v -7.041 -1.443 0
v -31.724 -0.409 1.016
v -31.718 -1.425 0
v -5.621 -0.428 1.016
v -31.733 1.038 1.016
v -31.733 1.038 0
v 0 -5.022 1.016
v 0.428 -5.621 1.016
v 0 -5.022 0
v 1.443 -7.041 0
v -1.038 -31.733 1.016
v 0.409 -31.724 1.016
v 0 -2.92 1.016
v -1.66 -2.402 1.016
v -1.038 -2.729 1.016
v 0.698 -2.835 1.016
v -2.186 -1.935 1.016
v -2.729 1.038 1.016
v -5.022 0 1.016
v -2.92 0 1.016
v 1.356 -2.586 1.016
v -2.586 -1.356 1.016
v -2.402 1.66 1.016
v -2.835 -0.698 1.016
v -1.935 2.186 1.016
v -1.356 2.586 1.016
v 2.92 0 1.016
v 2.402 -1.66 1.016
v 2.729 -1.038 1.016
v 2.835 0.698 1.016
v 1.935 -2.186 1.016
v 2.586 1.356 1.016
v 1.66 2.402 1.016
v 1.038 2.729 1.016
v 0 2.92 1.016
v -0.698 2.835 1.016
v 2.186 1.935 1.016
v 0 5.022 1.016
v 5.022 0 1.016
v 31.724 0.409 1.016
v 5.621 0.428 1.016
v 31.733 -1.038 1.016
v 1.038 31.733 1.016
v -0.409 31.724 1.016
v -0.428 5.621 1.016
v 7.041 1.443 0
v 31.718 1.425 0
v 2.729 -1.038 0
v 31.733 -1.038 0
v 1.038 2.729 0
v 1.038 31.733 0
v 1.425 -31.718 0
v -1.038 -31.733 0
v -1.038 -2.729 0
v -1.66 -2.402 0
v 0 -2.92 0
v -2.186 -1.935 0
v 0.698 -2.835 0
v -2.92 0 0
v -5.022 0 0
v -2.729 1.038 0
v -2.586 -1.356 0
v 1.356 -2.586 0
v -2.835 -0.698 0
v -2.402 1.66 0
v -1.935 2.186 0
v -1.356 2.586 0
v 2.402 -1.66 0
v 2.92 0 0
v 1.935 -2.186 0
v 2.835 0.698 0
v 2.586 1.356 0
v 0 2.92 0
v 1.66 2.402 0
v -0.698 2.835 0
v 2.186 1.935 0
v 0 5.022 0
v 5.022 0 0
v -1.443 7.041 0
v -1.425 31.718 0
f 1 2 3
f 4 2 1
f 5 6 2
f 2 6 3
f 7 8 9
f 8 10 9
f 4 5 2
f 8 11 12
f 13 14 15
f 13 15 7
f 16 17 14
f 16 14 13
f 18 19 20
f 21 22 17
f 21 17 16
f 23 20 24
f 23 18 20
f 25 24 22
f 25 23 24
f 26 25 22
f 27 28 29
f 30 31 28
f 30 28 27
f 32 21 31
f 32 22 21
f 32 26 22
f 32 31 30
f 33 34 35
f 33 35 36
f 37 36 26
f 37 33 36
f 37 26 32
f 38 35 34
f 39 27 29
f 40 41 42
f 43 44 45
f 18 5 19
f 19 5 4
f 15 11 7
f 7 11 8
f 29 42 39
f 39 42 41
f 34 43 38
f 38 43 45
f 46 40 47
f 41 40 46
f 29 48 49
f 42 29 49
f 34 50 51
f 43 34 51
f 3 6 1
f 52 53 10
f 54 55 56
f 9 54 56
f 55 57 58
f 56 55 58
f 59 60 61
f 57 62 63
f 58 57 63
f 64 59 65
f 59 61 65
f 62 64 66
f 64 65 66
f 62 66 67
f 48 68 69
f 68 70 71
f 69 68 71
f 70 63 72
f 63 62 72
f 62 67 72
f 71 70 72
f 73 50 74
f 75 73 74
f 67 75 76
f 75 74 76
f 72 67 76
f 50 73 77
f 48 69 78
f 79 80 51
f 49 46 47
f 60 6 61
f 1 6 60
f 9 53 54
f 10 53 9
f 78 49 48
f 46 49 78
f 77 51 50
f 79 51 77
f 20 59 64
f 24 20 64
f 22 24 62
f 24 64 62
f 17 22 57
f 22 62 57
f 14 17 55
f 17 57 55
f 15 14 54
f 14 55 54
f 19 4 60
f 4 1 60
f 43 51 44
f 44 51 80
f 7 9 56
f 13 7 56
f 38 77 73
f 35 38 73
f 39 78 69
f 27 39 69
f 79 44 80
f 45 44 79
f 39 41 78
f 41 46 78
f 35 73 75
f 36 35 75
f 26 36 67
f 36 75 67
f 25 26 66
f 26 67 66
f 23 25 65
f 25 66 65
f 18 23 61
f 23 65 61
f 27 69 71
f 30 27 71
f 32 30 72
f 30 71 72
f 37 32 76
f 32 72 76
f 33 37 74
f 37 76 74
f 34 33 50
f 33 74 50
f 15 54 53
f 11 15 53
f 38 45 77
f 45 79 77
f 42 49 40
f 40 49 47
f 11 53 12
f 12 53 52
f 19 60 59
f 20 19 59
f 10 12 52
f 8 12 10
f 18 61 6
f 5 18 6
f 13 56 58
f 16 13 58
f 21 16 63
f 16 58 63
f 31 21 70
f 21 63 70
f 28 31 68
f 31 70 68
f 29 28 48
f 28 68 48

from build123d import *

# Parameters (mm, degrees)
F1_DEPTH = 1.016
F2_SIZE  = 1.01599


# Not quite as in the source:
# - a fillet or chamfer is up to 0.001 mm smaller than in the source, because OpenCascade refuses the exact size


with BuildPart() as f1:
    # F0 (on Top) → F1 (new body)
    with BuildSketch(Plane.XY):
        with BuildLine():
            ThreePointArc((0, 2.9195159057), (0.527538065, 2.8714589869), (1.0377089673, 2.7288703199))
            Line((1.0377089673, 2.7288703199), (1.0377089673, 31.7330373601))
            Line((1.0377089673, 31.7330373601), (-1.4246536514, 31.7180210917))
            Line((-1.4246536514, 31.7180210917), (-1.4426441077, 7.0411415527))
            Line((-1.4426441077, 7.0411415527), (0, 5.0220009871))
            Line((0, 5.0220009871), (0, 2.9195159057))
        make_face()
        with BuildLine():
            Line((1.0377089673, 1.7452047762), (1.0377089673, 2.7288703199))
            ThreePointArc((1.0377089673, 2.7288703199), (0.527538065, 2.8714589869), (0, 2.9195159057))
            Line((0, 2.9195159057), (1.0377089673, 1.7452047762))
        make_face()
        with BuildLine():
            Line((1.7452047762, -1.0377089673), (2.9195159057, 0))
            ThreePointArc((2.9195159057, 0), (2.4034538646, 1.6574023784), (1.0377089673, 2.7288703199))
            Line((1.0377089673, 2.7288703199), (1.0377089673, 1.7452047762))
            Line((1.0377089673, 1.7452047762), (0, 2.9195159057))
            ThreePointArc((0, 2.9195159057), (-1.6574023784, 2.4034538646), (-2.7288703199, 1.0377089673))
            Line((-2.7288703199, 1.0377089673), (-1.7452047762, 1.0377089673))
            Line((-1.7452047762, 1.0377089673), (-2.9195159057, 0))
            ThreePointArc((-2.9195159057, 0), (-2.4034538646, -1.6574023784), (-1.0377089673, -2.7288703199))
            Line((-1.0377089673, -2.7288703199), (-1.0377089673, -1.7452047762))
            Line((-1.0377089673, -1.7452047762), (0, -2.9195159057))
            ThreePointArc((0, -2.9195159057), (1.6574023784, -2.4034538646), (2.7288703199, -1.0377089673))
            Line((2.7288703199, -1.0377089673), (1.7452047762, -1.0377089673))
        make_face()
        with BuildLine():
            Line((-1.7452047762, 1.0377089673), (-2.7288703199, 1.0377089673))
            ThreePointArc((-2.7288703199, 1.0377089673), (-2.8714589869, 0.527538065), (-2.9195159057, 0))
            Line((-2.9195159057, 0), (-1.7452047762, 1.0377089673))
        make_face()
        with BuildLine():
            ThreePointArc((2.7288703199, -1.0377089673), (2.8714589869, -0.527538065), (2.9195159057, 0))
            Line((2.9195159057, 0), (1.7452047762, -1.0377089673))
            Line((1.7452047762, -1.0377089673), (2.7288703199, -1.0377089673))
        make_face()
        with BuildLine():
            Line((5.0220009871, 0), (2.9195159057, 0))
            ThreePointArc((2.9195159057, 0), (2.8714589869, -0.527538065), (2.7288703199, -1.0377089673))
            Line((2.7288703199, -1.0377089673), (31.7330373601, -1.0377089673))
            Line((31.7330373601, -1.0377089673), (31.7180210917, 1.4246536514))
            Line((31.7180210917, 1.4246536514), (7.0411415527, 1.4426441077))
            Line((7.0411415527, 1.4426441077), (5.0220009871, 0))
        make_face()
        with BuildLine():
            ThreePointArc((-1.0377089673, -2.7288703199), (-0.527538065, -2.8714589869), (0, -2.9195159057))
            Line((0, -2.9195159057), (-1.0377089673, -1.7452047762))
            Line((-1.0377089673, -1.7452047762), (-1.0377089673, -2.7288703199))
        make_face()
        with BuildLine():
            Line((0, -5.0220009871), (0, -2.9195159057))
            ThreePointArc((0, -2.9195159057), (-0.527538065, -2.8714589869), (-1.0377089673, -2.7288703199))
            Line((-1.0377089673, -2.7288703199), (-1.0377089673, -31.7330373601))
            Line((-1.0377089673, -31.7330373601), (1.4246536514, -31.7180210917))
            Line((1.4246536514, -31.7180210917), (1.4426441077, -7.0411415527))
            Line((1.4426441077, -7.0411415527), (0, -5.0220009871))
        make_face()
        with BuildLine():
            ThreePointArc((-2.9195159057, 0), (-2.8714589869, 0.527538065), (-2.7288703199, 1.0377089673))
            Line((-2.7288703199, 1.0377089673), (-31.7330373601, 1.0377089673))
            Line((-31.7330373601, 1.0377089673), (-31.7180210917, -1.4246536514))
            Line((-31.7180210917, -1.4246536514), (-7.0411415527, -1.4426441077))
            Line((-7.0411415527, -1.4426441077), (-5.0220009871, 0))
            Line((-5.0220009871, 0), (-2.9195159057, 0))
        make_face()
    extrude(amount=F1_DEPTH)

    # F2 (size 1.016 in the source; OpenCascade refuses exactly that, so slightly less here)
    f2_edges = [f1.edges().sort_by_distance(p)[0] for p in [
        (-19.379581, -1.433649, 1.016),
        (1.433649, -19.379581, 1.016),
        (19.379581, 1.433649, 1.016),
        (-1.433649, 19.379581, 1.016),
    ]]
    chamfer(f2_edges, length=F2_SIZE)


solid = f1.part
